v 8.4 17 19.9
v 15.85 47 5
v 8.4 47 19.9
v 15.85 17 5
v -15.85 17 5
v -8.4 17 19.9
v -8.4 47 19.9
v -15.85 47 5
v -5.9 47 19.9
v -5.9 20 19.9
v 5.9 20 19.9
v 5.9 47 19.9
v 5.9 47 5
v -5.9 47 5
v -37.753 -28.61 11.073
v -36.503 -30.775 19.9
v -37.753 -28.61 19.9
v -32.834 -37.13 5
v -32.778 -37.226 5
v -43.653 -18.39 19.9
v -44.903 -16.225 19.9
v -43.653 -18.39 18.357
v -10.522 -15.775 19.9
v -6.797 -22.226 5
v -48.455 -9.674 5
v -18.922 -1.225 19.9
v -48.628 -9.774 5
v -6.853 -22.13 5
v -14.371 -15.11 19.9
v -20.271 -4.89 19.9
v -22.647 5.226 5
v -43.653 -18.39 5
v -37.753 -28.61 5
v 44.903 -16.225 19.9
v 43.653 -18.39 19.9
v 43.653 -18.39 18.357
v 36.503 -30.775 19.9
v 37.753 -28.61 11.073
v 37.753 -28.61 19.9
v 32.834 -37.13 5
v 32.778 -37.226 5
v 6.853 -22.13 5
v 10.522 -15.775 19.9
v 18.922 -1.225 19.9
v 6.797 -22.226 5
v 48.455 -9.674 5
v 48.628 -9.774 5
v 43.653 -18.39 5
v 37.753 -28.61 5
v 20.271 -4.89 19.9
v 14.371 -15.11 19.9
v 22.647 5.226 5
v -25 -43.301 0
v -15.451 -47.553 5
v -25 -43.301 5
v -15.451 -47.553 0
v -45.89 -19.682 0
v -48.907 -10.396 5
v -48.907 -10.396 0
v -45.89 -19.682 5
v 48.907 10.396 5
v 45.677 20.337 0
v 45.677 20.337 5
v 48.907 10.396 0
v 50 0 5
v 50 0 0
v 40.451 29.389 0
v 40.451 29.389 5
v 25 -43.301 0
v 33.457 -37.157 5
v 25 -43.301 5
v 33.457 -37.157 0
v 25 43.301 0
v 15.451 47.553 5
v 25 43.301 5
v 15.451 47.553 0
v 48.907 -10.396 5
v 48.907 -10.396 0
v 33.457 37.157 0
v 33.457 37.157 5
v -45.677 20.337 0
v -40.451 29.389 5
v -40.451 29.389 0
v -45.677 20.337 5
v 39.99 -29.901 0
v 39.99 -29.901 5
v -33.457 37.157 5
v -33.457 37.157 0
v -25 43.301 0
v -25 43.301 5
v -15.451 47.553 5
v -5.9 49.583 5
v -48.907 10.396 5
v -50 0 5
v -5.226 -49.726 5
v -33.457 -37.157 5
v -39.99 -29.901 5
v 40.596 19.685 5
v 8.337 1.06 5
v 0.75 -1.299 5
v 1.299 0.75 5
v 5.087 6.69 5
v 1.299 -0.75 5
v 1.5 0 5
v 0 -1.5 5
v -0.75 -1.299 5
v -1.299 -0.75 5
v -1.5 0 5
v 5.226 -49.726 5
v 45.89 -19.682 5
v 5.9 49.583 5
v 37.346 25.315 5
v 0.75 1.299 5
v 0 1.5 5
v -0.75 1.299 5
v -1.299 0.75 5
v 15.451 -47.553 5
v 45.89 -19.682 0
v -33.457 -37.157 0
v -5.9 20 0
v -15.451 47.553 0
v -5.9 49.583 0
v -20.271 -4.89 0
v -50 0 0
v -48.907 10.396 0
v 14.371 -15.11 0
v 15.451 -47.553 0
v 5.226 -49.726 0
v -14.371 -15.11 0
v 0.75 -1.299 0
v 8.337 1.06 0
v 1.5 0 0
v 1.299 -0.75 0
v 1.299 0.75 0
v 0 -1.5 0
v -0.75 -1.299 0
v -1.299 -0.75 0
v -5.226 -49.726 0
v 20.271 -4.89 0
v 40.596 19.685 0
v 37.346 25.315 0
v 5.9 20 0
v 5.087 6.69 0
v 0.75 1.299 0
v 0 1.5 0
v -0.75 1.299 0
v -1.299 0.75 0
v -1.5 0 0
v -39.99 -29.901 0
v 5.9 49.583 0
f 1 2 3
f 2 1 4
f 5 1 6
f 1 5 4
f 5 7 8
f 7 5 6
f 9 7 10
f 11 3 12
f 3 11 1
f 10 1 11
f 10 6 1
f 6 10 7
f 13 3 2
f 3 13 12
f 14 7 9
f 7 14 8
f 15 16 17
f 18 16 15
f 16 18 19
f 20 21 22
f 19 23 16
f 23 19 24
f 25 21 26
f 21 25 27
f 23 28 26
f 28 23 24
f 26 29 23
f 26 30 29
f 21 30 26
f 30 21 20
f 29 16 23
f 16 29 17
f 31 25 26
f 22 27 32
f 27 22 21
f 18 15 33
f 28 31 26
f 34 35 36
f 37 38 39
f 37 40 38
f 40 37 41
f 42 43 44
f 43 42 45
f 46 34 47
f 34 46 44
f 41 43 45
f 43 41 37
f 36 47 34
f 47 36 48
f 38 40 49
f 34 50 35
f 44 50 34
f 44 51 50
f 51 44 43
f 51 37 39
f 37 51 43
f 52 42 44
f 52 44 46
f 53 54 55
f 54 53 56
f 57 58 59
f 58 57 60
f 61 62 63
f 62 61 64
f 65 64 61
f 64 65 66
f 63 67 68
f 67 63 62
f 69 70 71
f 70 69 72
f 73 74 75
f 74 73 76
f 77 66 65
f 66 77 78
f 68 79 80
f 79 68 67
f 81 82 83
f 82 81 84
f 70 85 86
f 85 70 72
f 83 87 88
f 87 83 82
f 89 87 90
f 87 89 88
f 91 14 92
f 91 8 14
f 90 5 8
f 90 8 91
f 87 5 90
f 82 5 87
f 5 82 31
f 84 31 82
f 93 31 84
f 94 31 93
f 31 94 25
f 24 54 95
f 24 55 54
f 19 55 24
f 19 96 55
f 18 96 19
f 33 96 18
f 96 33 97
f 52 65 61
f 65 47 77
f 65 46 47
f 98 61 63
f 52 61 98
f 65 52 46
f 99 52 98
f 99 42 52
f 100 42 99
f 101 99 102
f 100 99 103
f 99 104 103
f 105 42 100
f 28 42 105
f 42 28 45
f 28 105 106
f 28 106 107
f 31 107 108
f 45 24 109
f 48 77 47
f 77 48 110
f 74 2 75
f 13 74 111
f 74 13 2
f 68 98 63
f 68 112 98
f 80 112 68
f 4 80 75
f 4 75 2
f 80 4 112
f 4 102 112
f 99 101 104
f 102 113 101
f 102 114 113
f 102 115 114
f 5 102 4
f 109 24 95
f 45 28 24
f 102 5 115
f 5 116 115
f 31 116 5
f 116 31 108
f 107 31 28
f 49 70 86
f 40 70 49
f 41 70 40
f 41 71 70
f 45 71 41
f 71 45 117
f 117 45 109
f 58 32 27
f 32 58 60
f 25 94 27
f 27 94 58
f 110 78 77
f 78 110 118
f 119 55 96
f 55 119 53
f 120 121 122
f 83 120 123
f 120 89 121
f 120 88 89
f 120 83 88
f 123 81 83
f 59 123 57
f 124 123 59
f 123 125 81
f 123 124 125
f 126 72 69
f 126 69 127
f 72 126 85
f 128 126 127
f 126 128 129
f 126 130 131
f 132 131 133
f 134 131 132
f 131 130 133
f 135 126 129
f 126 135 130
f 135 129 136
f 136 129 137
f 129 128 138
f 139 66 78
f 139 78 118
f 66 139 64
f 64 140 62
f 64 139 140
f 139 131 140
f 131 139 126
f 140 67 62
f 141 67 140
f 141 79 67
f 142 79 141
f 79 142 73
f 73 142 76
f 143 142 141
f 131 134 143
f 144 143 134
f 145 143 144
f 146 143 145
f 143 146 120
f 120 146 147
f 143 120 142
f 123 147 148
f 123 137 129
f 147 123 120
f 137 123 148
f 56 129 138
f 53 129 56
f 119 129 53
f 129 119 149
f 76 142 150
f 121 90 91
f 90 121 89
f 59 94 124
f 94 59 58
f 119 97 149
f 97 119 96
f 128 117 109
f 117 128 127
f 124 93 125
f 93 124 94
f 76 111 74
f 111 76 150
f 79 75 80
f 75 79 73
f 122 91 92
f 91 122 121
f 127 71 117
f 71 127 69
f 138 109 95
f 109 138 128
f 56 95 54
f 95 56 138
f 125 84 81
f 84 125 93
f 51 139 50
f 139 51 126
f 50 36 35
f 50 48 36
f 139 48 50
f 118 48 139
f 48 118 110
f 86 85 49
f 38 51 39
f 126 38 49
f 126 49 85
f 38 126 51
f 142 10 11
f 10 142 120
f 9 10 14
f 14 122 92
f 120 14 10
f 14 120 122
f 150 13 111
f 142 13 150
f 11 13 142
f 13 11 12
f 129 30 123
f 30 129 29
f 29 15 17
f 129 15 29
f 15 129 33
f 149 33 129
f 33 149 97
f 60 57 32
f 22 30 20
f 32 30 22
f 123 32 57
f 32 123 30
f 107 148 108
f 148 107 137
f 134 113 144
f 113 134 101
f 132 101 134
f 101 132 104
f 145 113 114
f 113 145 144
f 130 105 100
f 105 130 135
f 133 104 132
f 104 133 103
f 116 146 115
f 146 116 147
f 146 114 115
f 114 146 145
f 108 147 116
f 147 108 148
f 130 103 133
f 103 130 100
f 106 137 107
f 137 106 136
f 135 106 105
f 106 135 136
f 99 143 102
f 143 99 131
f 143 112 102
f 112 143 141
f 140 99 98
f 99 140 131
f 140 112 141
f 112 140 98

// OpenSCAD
// Rocket fin guide
// Print 2 plates and 2 adapters that fit in the body tube / engine mount

plateod=100; // plate outer diameter - 100mm to fit on my Mosaic
plateh=5; // plate height
nfins=3; // number of fins
fint=2.8; // fin thickness
stript=4.5; // thickness of strips used to clamp fins
screwd=3; // diameter of screw to attach tube adapter (M3)
screwheadd=5.5; // screw head diameter (M3)
rodslotw=6.5; // width of slot for rod (fits 1/4" threaded rod)
rodslotoffset=5; // Offset of rod slot from outer edge and central screw hole
finslotl=30; // Length of fin slot
finslotw=fint+2*stript; // Width of fin slot - calculated from fin thickness & strip thickness

// Fin slot blister parameters
finsloth=15; // Height of fin slot blister
finslotbasew=20+finslotw; // Width of fin slot blister base
finslottopw=5+finslotw; // Width of top of fin slot bister
finslotoffset=3; // Displacement of fin slot blister in from outer edge


//tubeid=38; // Body tube inner diameter (for 38mm body tube)
tubeid=28.5; // Body tube inner diameter (for 29mm engine mount)
adapterh=20; // Height of body tube adapter
adaptert=2; // Adapter thickness

// Body tube / engine mount adapter
module adapter()
	difference(){
		cylinder(r=tubeid/2,h=adapterh);
		translate([0,0,adaptert]) cylinder(r=tubeid/2-adaptert,h=adapterh);
		translate([0,0,-1]) cylinder(r=screwd/2,h=adaptert+2,$fn=12);
	}


module finslotblister()
translate([0,plateod/2-finslotoffset,0])
rotate([90,0,0])
linear_extrude(height=finslotl)
	polygon([
		[-finslotbasew/2,0],[finslotbasew/2,0],
		[finslottopw/2,finsloth],
		[-finslottopw/2,finsloth]]);

module plate()
difference(){
	union(){
		// Plate
		cylinder(r=plateod/2,h=plateh);
		// Blisters for fin slots
		for(i=[0:nfins-1])
			rotate([0,0,i*360/nfins])
				translate([0,0,plateh-.1]) finslotblister();
	}
	// Screw hole for body tube adapter
	translate([0,0,-1]) cylinder(r=screwd/2,h=plateh+2,$fn=12);
	for(i=[0:nfins-1])
		rotate([0,0,i*(360/nfins)-30]) translate([plateod/2-finslotl,-finslotw/2,-1]) cube([2*finslotl,finslotw,plateh+finsloth+2]);
	rotate([0,0,360/nfins/2-30]) translate([screwheadd/2+rodslotoffset,-rodslotw/2,-1]) cube([plateod/2-screwheadd/2-2*rodslotoffset,rodslotw,plateh+2]);
}

plate();
//adapter();
